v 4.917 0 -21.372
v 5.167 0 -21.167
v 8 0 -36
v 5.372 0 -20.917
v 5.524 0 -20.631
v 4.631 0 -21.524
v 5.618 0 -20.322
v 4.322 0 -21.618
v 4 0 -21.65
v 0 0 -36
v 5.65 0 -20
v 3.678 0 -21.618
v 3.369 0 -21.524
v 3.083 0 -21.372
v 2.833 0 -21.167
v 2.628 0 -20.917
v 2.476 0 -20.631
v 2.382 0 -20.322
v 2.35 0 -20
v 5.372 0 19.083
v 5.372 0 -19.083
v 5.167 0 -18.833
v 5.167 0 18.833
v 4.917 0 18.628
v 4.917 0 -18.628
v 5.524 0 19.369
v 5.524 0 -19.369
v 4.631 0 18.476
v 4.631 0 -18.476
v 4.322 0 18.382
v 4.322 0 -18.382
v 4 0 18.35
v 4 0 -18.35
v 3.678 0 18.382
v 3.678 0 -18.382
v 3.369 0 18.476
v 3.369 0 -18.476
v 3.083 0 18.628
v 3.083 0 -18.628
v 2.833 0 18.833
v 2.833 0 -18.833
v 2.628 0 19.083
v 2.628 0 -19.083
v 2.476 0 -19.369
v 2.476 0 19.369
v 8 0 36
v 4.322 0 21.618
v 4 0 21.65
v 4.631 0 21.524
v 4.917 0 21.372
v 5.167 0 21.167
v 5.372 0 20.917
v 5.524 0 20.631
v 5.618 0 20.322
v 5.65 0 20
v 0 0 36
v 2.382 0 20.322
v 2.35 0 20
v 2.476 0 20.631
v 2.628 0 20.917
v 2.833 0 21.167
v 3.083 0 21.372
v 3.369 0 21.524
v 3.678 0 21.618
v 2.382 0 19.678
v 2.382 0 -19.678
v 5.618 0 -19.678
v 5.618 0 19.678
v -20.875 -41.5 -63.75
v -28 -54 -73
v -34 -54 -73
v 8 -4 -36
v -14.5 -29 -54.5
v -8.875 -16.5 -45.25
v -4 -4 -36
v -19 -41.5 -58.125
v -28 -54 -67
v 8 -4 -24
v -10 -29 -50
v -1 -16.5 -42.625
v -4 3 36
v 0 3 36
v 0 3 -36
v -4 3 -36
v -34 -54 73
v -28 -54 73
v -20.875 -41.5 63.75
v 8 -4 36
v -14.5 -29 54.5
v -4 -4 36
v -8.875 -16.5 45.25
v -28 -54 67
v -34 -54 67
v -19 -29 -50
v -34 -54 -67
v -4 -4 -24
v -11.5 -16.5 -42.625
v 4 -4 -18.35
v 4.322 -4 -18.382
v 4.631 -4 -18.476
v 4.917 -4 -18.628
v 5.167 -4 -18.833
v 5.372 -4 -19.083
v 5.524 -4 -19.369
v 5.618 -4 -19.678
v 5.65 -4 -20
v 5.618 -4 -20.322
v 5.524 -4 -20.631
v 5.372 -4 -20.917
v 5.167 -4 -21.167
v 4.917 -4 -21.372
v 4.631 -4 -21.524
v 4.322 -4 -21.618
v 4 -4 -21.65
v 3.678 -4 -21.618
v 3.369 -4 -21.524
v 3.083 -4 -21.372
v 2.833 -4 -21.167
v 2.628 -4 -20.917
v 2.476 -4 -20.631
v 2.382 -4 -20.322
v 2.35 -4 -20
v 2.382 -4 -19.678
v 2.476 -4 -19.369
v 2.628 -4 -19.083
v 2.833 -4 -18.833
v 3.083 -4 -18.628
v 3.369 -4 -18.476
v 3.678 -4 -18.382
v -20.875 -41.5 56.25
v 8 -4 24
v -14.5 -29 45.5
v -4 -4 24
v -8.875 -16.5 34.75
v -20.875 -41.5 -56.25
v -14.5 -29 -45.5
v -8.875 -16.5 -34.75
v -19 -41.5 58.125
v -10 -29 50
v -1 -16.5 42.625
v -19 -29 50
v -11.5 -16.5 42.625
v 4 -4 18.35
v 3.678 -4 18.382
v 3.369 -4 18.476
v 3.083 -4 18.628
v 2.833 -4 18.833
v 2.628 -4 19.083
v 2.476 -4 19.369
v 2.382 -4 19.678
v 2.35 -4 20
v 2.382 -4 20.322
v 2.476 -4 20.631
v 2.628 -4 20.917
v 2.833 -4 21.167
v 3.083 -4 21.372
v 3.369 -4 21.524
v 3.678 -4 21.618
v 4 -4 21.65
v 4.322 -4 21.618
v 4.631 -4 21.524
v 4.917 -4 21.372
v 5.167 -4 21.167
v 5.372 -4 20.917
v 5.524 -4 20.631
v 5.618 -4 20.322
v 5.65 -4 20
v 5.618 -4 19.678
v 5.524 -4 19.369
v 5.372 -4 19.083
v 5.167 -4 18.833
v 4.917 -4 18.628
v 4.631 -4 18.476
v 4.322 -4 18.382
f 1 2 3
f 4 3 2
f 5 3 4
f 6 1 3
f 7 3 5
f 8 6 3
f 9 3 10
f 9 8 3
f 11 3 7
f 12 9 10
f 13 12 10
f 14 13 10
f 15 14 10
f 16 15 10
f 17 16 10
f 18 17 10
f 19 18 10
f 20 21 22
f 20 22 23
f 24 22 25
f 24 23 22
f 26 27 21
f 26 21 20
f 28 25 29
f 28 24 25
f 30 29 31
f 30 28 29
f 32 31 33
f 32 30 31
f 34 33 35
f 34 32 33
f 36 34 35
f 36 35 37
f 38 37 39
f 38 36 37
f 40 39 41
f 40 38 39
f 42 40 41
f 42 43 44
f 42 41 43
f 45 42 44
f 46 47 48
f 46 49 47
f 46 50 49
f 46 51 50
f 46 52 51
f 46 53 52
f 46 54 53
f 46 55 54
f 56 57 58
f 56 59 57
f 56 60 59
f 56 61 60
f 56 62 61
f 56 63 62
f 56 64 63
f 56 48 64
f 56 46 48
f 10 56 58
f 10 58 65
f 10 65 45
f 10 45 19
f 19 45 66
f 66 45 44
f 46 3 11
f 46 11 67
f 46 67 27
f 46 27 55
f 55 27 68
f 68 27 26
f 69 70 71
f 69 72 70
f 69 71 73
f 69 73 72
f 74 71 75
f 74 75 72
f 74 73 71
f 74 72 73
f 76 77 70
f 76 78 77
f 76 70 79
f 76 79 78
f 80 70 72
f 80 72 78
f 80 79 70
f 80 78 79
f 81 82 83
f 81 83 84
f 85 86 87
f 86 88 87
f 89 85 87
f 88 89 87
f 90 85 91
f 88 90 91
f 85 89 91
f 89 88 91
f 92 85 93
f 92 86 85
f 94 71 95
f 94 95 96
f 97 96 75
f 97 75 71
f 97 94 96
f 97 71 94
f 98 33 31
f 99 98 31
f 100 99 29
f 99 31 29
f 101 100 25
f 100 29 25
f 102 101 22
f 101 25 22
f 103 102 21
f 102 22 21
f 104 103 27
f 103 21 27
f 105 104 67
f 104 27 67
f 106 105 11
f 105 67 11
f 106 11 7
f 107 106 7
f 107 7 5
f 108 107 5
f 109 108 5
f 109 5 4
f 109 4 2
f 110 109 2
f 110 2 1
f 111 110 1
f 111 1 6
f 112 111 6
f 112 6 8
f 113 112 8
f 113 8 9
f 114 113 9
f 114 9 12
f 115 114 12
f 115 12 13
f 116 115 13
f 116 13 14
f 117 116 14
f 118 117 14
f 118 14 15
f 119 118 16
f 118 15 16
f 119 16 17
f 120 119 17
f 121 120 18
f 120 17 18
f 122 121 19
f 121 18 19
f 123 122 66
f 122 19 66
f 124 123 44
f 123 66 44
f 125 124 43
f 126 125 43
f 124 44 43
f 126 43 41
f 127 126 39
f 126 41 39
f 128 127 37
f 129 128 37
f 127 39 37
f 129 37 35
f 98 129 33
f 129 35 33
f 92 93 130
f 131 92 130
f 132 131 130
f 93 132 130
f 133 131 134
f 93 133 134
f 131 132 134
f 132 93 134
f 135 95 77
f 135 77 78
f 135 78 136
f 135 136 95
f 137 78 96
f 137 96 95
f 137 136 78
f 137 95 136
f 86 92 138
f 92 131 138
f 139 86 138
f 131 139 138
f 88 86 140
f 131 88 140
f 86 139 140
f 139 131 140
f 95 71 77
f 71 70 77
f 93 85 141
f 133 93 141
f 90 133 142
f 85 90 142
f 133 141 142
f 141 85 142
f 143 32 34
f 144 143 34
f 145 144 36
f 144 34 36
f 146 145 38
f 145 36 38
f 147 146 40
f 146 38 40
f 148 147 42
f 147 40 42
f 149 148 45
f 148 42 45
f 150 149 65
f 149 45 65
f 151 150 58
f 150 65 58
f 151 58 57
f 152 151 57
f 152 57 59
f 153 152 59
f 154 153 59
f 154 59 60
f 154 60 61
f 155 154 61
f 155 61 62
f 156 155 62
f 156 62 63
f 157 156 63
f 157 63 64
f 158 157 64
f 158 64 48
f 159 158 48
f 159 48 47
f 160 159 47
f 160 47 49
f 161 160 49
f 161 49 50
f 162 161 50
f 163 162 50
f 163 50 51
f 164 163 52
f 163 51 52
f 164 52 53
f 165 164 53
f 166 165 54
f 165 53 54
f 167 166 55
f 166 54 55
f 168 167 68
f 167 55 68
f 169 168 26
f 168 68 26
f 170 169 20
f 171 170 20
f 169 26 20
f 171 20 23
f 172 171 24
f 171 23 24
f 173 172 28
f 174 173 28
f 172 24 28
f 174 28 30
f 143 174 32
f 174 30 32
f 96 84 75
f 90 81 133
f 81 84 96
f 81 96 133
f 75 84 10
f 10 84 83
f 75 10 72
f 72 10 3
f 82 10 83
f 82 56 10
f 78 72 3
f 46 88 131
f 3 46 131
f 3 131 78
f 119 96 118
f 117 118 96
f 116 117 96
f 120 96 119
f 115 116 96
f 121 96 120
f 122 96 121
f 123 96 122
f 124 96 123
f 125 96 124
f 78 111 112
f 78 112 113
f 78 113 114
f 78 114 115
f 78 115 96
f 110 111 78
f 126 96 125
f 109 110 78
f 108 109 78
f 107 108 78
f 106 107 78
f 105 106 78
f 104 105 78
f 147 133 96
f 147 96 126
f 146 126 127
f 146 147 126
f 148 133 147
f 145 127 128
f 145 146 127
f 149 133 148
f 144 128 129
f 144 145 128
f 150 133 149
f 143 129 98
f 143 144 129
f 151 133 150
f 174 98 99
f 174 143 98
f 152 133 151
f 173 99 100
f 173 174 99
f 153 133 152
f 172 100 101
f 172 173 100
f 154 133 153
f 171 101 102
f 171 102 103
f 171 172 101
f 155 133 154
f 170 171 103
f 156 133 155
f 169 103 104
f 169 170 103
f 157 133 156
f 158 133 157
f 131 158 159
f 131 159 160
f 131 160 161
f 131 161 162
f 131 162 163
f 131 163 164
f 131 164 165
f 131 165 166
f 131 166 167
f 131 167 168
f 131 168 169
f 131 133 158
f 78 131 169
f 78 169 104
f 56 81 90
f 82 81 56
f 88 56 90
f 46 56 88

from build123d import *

# Parameters (mm, degrees)
EXTRUDE_1_DEPTH     = 36
SKETCH_2_R          = 1.65
CUT_EXTRUDE_1_DEPTH = 38.094473982


with BuildPart() as part:
    # 草图1 → 凸台-拉伸1 (new, symmetric)
    with BuildSketch(Plane.XY):
        Polygon((0, 0), (0, 3), (-4, 3), (-4, -4), (8, -4), (8, 0), align=None)
    extrude(amount=EXTRUDE_1_DEPTH, both=True)

    # 草图2 → 切除-拉伸1 (cut, through all)
    with BuildSketch(Plane(origin=(0, 0, 0), x_dir=(1, 0, 0), z_dir=(0, 1, 0))):
        with Locations(Location((4, 20, 0), (0, 0, 270))):
            Circle(SKETCH_2_R)
        with Locations(Location((4, -20, 0), (0, 0, 90))):
            Circle(SKETCH_2_R)
    extrude(amount=-CUT_EXTRUDE_1_DEPTH, mode=Mode.SUBTRACT)

    # 边界1: read off the stored shape, not the designer's step
    # 边界1: loft between two sections, ruled curve by curve
    other_1_from = [
        Edge.make_line((-34, -54, -73), (-34, -54, -67)),
        Edge.make_line((-34, -54, -67), (-28, -54, -67)),
        Edge.make_line((-28, -54, -67), (-28, -54, -73)),
        Edge.make_line((-28, -54, -73), (-34, -54, -73)),
    ]
    other_1_to = [
        Edge.make_line((-4, -4, -36), (-4, -4, -24)),
        Edge.make_line((-4, -4, -24), (8, -4, -24)),
        Edge.make_line((8, -4, -24), (8, -4, -36)),
        Edge.make_line((8, -4, -36), (-4, -4, -36)),
    ]
    other_1 = Solid(Shell([*[Face.make_surface_from_curves(other_1_from[k], other_1_to[k]) for k in range(4)], Face(Wire(other_1_from)), Face(Wire(other_1_to))]))
    add(other_1)

    # 镜向2: 边界1 across plane
    add(other_1.mirror(Plane.XY))


solid = part.part
